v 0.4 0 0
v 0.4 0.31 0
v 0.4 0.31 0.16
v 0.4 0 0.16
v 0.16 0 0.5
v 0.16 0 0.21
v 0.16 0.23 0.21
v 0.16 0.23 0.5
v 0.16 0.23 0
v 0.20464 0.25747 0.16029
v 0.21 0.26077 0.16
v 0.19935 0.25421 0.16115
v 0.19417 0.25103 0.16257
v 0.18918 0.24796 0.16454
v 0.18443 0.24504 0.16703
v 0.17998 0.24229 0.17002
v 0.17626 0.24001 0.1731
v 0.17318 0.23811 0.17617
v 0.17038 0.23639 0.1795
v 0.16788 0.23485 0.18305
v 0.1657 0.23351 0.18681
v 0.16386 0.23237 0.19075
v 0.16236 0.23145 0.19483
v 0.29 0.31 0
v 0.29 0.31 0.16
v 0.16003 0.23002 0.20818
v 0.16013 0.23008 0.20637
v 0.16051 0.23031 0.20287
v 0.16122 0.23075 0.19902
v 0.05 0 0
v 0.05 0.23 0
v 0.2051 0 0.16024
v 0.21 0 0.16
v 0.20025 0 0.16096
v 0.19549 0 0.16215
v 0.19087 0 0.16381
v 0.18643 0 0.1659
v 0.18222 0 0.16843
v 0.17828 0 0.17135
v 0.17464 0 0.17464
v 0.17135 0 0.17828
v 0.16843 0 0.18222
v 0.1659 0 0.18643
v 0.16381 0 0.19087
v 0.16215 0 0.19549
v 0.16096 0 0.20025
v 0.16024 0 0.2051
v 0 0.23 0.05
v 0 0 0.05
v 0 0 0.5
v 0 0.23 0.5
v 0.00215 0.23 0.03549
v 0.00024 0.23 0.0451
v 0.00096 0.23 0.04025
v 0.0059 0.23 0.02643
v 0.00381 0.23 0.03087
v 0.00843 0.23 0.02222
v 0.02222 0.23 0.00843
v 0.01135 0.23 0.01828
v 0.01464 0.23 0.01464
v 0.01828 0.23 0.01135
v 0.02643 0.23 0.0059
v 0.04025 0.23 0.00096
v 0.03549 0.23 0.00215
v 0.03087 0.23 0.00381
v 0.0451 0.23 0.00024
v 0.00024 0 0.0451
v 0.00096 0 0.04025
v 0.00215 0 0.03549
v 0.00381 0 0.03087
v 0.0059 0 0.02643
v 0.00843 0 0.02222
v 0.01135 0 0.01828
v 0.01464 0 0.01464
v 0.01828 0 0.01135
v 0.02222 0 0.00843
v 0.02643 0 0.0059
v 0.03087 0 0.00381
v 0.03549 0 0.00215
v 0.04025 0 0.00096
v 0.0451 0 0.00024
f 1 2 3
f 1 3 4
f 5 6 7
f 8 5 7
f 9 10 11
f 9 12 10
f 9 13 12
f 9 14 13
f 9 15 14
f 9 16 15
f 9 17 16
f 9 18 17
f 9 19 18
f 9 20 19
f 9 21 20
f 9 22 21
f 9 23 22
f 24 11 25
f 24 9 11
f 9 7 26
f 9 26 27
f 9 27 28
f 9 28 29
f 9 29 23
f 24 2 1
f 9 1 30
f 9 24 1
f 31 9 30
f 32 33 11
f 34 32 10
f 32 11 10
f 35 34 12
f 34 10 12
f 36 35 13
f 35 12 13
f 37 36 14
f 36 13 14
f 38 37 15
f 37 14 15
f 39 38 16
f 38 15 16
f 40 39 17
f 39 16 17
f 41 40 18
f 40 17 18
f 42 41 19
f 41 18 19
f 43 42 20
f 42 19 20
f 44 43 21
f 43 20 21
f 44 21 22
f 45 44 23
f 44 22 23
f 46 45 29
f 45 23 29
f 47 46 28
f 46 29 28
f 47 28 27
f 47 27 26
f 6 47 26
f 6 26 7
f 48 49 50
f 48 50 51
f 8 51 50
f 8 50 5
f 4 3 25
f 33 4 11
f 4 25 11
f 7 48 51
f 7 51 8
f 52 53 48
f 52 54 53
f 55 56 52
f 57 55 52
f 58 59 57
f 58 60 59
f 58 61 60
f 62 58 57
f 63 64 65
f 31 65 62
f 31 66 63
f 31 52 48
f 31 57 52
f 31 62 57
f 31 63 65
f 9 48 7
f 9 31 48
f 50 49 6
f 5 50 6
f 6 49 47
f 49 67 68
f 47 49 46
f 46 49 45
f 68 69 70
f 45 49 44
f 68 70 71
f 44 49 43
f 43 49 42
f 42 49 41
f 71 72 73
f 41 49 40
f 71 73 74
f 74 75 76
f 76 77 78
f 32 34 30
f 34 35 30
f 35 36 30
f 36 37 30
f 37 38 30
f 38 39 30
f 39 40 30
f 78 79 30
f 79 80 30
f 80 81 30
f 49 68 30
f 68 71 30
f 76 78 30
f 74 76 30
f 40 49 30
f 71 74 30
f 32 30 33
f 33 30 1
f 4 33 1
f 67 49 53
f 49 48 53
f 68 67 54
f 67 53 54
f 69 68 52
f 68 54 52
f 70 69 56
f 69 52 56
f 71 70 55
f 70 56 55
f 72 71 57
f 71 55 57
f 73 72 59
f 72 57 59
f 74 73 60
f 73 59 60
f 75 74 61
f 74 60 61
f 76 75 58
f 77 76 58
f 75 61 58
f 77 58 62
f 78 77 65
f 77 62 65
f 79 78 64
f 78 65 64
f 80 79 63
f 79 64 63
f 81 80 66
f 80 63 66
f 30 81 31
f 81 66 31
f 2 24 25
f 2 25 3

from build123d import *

# Parameters (mm, degrees)
EXTRUDE_1_DEPTH = 0.16
SKETCH_2_W      = 0.16
SKETCH_2_H      = 0.23
EXTRUDE_2_DEPTH = 0.34
FILLET_1_R      = 0.05


with BuildPart() as part:
    # 草图1 → 凸台-拉伸1 (new body)
    with BuildSketch(Plane.XY):
        Polygon((0, 0), (0, 0.23), (0.16, 0.23), (0.29, 0.31), (0.4, 0.31), (0.4, 0), align=None)
    extrude(amount=EXTRUDE_1_DEPTH)

    # 草图2 → 凸台-拉伸2 (add)
    with BuildSketch(Plane.XY.offset(0.16)):
        with Locations((0.08, 0.115)):
            Rectangle(SKETCH_2_W, SKETCH_2_H)
    extrude(amount=EXTRUDE_2_DEPTH)

    # 圆角1
    fillet_1_edges = [part.edges().sort_by_distance(p)[0] for p in [
        (0.16, 0.115, 0.16),
        (0, 0.115, 0),
    ]]
    fillet(fillet_1_edges, radius=FILLET_1_R)


solid = part.part
